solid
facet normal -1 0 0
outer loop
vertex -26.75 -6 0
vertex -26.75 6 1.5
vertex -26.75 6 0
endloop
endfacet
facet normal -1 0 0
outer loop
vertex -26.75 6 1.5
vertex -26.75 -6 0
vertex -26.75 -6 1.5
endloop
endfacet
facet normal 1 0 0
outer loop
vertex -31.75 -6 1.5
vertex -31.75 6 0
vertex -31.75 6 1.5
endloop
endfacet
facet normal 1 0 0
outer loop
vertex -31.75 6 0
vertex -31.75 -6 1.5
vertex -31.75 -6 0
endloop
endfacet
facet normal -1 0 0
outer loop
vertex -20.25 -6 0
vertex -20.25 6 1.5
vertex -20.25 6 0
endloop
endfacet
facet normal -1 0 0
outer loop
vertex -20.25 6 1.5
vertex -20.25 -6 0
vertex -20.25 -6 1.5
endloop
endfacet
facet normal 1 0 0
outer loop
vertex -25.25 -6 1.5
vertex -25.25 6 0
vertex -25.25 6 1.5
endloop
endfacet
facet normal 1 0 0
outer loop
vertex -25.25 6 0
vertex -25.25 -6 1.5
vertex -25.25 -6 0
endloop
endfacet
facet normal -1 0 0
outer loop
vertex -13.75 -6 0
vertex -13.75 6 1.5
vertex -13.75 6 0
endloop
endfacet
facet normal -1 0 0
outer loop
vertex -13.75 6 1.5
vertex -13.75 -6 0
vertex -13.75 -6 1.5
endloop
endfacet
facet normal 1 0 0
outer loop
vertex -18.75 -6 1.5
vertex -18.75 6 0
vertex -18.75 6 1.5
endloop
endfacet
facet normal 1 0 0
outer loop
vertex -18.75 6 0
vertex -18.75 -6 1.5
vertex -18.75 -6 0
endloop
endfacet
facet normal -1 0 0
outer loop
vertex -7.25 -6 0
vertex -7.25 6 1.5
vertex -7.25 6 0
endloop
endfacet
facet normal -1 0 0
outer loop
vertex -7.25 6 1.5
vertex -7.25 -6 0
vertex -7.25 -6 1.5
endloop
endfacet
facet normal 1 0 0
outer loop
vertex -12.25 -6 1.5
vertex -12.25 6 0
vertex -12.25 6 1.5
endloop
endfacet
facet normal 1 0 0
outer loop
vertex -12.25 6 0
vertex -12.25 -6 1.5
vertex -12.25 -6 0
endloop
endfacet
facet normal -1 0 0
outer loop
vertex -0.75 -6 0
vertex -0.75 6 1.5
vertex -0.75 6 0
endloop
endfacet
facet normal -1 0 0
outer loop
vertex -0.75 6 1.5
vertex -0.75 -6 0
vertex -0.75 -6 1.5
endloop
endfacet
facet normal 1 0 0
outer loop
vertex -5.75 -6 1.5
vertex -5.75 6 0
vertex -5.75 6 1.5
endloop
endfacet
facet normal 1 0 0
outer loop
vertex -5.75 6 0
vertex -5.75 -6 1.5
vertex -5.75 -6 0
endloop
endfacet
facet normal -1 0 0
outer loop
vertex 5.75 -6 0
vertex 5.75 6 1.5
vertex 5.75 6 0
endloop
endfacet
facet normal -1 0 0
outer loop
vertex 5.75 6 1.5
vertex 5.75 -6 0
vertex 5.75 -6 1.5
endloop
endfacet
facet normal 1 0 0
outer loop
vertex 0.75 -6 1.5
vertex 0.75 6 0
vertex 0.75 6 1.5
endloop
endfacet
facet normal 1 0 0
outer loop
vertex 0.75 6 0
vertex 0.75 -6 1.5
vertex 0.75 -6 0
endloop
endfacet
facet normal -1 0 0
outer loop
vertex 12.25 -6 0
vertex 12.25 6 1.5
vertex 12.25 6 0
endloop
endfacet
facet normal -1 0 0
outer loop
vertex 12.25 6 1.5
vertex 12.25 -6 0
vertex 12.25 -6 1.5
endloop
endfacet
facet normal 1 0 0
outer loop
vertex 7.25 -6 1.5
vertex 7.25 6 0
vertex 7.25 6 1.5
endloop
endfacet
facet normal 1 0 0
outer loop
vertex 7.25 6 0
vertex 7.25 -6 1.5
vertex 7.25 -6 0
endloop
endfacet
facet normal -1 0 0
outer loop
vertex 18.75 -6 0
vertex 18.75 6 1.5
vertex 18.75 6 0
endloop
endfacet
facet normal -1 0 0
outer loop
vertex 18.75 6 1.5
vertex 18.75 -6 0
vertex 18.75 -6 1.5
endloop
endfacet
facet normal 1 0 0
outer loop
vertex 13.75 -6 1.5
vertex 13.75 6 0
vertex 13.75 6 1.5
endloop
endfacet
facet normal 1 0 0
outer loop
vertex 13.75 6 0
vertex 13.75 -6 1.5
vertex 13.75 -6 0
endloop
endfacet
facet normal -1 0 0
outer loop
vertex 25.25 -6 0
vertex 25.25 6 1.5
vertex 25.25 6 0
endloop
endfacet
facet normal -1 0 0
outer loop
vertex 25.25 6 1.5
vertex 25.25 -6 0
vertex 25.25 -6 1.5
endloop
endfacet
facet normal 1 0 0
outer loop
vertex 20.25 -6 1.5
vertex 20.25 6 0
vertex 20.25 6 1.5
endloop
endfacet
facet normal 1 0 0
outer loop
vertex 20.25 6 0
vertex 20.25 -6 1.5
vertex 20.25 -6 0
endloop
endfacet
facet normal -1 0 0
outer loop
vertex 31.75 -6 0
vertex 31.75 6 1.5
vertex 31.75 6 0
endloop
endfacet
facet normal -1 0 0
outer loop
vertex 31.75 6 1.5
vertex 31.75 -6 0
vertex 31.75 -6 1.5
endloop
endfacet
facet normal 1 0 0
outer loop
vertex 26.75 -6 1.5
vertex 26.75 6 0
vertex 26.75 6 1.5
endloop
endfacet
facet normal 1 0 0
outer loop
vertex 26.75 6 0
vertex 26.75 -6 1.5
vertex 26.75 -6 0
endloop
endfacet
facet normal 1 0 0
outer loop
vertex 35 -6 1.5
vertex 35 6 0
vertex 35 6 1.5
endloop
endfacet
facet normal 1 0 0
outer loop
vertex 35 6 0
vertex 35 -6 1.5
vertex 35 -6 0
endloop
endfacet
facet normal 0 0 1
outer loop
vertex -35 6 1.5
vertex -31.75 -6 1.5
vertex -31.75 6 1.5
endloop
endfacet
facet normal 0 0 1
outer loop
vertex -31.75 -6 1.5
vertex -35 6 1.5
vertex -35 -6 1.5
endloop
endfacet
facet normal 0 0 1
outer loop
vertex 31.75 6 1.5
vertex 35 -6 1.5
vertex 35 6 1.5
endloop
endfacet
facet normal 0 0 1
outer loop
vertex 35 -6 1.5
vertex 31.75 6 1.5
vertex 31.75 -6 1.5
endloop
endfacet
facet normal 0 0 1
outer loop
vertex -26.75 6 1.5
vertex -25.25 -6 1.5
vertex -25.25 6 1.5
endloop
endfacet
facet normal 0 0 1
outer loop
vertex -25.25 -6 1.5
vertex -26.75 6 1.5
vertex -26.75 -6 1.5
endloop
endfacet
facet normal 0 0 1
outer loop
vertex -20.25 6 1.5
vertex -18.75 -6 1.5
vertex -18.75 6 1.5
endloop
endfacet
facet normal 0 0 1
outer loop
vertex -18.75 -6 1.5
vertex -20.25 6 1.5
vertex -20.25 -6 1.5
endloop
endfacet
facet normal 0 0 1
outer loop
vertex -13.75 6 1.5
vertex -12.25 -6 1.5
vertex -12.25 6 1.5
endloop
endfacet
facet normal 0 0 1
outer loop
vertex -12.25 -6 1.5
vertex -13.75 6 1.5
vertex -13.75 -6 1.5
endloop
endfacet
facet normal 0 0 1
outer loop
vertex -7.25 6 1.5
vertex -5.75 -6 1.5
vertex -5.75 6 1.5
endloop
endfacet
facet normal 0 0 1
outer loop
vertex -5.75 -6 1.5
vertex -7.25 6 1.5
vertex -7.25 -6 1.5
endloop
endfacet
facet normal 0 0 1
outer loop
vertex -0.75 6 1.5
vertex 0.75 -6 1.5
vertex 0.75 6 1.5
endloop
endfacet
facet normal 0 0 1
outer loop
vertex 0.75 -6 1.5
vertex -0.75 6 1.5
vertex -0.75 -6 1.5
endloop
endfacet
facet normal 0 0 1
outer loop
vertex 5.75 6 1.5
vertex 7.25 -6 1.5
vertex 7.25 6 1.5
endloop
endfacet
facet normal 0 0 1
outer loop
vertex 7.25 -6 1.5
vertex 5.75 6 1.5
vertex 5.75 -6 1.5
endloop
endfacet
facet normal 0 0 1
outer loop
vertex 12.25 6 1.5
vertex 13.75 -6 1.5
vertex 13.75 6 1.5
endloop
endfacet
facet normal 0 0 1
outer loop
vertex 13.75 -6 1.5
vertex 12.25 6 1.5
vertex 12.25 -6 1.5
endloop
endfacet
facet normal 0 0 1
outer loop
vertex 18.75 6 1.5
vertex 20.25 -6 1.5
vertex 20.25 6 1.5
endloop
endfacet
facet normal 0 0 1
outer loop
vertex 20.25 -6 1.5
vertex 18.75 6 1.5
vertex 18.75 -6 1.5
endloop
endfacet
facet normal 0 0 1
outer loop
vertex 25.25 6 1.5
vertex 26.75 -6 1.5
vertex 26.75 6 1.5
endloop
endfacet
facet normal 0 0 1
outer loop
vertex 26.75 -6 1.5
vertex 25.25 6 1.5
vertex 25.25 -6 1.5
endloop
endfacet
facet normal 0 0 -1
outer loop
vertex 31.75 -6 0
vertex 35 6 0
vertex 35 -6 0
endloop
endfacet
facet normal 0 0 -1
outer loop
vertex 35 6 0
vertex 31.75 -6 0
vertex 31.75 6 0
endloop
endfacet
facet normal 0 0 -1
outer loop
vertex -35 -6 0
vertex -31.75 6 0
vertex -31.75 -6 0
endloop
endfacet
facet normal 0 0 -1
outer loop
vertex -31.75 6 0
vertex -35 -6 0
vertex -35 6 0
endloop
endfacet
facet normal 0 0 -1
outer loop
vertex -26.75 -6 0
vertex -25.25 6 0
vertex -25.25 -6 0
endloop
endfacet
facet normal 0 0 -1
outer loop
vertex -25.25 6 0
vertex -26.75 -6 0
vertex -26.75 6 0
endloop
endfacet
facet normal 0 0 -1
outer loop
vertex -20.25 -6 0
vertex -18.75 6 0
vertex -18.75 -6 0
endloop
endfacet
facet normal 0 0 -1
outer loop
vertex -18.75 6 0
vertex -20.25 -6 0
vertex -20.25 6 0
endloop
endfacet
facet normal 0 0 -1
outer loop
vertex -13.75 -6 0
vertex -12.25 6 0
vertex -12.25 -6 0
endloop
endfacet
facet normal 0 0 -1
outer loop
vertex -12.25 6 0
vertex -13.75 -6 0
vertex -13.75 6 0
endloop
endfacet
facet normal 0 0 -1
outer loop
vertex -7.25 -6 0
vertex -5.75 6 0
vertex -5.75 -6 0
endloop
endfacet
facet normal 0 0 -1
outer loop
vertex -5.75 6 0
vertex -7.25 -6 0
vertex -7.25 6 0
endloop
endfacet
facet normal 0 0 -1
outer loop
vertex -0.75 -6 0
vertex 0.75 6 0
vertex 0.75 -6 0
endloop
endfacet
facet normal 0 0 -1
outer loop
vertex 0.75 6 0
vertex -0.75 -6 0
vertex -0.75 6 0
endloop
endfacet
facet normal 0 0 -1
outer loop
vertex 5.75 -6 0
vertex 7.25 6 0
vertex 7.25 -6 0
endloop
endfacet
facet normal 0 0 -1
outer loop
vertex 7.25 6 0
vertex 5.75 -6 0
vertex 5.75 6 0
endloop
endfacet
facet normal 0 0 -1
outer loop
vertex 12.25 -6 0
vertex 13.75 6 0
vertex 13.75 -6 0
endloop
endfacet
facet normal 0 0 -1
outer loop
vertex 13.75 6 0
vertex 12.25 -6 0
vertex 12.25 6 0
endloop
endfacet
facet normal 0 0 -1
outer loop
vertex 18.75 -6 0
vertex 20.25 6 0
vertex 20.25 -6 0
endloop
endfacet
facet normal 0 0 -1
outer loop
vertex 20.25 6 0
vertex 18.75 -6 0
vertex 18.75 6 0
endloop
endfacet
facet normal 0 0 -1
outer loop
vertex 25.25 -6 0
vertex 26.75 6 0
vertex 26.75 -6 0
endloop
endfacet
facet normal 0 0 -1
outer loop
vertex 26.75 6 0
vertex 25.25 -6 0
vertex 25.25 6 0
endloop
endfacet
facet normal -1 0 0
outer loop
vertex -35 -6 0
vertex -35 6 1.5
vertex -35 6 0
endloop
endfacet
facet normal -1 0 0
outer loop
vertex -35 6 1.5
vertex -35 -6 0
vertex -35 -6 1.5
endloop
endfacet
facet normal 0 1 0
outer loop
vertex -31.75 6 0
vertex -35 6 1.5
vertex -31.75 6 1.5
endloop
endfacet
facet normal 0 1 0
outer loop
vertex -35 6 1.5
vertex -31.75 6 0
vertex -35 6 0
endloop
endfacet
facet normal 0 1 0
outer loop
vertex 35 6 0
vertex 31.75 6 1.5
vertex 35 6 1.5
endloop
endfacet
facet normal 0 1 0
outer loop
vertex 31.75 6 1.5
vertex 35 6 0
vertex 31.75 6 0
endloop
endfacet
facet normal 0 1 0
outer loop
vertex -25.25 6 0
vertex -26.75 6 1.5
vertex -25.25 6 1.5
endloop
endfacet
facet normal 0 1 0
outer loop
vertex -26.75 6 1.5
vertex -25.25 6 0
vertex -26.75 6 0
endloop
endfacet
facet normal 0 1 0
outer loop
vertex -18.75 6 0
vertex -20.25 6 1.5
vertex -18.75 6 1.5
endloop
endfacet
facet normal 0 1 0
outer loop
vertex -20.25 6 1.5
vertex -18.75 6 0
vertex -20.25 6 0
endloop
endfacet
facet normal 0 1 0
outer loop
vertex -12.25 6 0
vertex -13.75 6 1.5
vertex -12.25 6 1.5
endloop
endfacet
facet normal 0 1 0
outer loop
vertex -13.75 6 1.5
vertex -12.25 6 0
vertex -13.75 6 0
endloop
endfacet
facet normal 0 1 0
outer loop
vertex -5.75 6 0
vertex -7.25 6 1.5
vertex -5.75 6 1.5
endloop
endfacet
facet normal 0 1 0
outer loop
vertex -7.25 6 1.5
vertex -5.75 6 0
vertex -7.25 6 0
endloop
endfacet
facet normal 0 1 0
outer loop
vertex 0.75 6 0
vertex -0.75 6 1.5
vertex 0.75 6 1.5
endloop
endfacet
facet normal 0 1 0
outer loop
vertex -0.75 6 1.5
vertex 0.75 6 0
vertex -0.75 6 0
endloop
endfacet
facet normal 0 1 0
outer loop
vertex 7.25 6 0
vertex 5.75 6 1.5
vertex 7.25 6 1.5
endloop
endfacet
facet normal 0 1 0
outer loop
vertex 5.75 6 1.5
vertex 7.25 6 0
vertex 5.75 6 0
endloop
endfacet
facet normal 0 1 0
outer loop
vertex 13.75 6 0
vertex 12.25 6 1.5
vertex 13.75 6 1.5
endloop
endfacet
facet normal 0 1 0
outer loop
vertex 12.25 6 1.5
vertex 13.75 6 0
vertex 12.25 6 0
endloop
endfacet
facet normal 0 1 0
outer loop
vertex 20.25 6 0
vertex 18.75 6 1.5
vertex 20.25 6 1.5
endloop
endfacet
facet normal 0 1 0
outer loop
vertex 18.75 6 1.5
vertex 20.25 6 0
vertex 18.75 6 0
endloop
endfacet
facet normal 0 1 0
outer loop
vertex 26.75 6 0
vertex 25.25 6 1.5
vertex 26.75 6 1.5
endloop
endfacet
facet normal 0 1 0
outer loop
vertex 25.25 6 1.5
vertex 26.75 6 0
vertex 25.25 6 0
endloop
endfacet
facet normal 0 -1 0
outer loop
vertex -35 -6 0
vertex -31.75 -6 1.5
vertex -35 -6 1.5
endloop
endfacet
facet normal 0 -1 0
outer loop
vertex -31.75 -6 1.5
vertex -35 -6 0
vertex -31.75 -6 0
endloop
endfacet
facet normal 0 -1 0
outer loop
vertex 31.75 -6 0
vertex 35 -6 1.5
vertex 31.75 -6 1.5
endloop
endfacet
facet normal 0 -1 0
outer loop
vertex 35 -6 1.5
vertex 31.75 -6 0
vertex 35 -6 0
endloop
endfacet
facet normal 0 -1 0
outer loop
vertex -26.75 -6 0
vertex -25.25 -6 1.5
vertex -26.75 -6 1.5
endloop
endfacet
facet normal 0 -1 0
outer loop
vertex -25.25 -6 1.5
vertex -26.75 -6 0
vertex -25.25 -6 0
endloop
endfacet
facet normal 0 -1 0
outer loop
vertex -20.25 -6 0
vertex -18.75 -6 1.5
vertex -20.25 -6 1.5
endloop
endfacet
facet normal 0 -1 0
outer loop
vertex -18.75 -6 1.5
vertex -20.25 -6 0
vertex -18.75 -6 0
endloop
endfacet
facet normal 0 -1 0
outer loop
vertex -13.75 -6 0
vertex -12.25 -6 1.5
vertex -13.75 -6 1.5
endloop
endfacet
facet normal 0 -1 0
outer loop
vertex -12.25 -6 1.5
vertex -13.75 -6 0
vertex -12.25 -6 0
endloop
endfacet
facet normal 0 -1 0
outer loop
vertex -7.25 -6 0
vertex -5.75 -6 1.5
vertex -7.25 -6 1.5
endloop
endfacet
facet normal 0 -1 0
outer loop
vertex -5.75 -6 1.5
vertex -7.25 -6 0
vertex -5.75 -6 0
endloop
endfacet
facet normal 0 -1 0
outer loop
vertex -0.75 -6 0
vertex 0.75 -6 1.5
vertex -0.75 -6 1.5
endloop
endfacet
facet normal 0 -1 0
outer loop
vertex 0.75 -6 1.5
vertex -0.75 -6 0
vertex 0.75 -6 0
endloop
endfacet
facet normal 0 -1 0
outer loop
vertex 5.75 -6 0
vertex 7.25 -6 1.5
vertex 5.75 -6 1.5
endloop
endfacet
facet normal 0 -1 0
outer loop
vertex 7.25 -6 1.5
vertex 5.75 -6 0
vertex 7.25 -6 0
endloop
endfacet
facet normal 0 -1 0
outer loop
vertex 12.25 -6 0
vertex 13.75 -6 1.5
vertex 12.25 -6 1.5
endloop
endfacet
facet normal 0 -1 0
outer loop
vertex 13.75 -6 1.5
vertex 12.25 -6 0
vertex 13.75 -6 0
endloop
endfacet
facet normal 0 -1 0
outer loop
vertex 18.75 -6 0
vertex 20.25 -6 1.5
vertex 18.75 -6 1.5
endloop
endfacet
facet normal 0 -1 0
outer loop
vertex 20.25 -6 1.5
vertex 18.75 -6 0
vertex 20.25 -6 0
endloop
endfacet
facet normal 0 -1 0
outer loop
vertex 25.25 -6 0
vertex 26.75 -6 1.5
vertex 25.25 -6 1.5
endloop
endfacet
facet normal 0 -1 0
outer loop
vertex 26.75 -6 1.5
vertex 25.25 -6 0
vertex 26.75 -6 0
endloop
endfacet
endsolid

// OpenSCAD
// 10-well comb for casting agarose gels
// Print orientation: flat on bed, teeth pointing down (-Y)

// ---------- Parameters ----------
plate_t      = 1.5;   // plate thickness (Z)
spine_len    = 70;    // spine length (X)
spine_w      = 12;    // spine width (Y)
tooth_w      = 5.0;   // tooth width (X)
tooth_len    = 12;    // tooth length (Y)
tooth_count  = 10;    // number of teeth
gap          = 1.5;   // gap between teeth (X)
eps          = 0.5;   // cutter overshoot past faces

$fn = 64;

// ---------- Derived ----------
pitch   = tooth_w + gap;          // centre-to-centre spacing of teeth
x_start = -(tooth_count - 1) * pitch / 2;  // first tooth centre (row centred on spine)

// ---------- Model ----------
difference() {
    // Base plate with spine
    translate([-spine_len / 2, -spine_w / 2, 0])
        cube([spine_len, spine_w, plate_t]);

    // Teeth cut out from the plate
    for (i = [0 : tooth_count - 1])
        translate([x_start + i * pitch - tooth_w / 2,
                   -tooth_len / 2 - eps,
                   -eps])
            cube([tooth_w, tooth_len + 2 * eps, plate_t + 2 * eps]);
}
